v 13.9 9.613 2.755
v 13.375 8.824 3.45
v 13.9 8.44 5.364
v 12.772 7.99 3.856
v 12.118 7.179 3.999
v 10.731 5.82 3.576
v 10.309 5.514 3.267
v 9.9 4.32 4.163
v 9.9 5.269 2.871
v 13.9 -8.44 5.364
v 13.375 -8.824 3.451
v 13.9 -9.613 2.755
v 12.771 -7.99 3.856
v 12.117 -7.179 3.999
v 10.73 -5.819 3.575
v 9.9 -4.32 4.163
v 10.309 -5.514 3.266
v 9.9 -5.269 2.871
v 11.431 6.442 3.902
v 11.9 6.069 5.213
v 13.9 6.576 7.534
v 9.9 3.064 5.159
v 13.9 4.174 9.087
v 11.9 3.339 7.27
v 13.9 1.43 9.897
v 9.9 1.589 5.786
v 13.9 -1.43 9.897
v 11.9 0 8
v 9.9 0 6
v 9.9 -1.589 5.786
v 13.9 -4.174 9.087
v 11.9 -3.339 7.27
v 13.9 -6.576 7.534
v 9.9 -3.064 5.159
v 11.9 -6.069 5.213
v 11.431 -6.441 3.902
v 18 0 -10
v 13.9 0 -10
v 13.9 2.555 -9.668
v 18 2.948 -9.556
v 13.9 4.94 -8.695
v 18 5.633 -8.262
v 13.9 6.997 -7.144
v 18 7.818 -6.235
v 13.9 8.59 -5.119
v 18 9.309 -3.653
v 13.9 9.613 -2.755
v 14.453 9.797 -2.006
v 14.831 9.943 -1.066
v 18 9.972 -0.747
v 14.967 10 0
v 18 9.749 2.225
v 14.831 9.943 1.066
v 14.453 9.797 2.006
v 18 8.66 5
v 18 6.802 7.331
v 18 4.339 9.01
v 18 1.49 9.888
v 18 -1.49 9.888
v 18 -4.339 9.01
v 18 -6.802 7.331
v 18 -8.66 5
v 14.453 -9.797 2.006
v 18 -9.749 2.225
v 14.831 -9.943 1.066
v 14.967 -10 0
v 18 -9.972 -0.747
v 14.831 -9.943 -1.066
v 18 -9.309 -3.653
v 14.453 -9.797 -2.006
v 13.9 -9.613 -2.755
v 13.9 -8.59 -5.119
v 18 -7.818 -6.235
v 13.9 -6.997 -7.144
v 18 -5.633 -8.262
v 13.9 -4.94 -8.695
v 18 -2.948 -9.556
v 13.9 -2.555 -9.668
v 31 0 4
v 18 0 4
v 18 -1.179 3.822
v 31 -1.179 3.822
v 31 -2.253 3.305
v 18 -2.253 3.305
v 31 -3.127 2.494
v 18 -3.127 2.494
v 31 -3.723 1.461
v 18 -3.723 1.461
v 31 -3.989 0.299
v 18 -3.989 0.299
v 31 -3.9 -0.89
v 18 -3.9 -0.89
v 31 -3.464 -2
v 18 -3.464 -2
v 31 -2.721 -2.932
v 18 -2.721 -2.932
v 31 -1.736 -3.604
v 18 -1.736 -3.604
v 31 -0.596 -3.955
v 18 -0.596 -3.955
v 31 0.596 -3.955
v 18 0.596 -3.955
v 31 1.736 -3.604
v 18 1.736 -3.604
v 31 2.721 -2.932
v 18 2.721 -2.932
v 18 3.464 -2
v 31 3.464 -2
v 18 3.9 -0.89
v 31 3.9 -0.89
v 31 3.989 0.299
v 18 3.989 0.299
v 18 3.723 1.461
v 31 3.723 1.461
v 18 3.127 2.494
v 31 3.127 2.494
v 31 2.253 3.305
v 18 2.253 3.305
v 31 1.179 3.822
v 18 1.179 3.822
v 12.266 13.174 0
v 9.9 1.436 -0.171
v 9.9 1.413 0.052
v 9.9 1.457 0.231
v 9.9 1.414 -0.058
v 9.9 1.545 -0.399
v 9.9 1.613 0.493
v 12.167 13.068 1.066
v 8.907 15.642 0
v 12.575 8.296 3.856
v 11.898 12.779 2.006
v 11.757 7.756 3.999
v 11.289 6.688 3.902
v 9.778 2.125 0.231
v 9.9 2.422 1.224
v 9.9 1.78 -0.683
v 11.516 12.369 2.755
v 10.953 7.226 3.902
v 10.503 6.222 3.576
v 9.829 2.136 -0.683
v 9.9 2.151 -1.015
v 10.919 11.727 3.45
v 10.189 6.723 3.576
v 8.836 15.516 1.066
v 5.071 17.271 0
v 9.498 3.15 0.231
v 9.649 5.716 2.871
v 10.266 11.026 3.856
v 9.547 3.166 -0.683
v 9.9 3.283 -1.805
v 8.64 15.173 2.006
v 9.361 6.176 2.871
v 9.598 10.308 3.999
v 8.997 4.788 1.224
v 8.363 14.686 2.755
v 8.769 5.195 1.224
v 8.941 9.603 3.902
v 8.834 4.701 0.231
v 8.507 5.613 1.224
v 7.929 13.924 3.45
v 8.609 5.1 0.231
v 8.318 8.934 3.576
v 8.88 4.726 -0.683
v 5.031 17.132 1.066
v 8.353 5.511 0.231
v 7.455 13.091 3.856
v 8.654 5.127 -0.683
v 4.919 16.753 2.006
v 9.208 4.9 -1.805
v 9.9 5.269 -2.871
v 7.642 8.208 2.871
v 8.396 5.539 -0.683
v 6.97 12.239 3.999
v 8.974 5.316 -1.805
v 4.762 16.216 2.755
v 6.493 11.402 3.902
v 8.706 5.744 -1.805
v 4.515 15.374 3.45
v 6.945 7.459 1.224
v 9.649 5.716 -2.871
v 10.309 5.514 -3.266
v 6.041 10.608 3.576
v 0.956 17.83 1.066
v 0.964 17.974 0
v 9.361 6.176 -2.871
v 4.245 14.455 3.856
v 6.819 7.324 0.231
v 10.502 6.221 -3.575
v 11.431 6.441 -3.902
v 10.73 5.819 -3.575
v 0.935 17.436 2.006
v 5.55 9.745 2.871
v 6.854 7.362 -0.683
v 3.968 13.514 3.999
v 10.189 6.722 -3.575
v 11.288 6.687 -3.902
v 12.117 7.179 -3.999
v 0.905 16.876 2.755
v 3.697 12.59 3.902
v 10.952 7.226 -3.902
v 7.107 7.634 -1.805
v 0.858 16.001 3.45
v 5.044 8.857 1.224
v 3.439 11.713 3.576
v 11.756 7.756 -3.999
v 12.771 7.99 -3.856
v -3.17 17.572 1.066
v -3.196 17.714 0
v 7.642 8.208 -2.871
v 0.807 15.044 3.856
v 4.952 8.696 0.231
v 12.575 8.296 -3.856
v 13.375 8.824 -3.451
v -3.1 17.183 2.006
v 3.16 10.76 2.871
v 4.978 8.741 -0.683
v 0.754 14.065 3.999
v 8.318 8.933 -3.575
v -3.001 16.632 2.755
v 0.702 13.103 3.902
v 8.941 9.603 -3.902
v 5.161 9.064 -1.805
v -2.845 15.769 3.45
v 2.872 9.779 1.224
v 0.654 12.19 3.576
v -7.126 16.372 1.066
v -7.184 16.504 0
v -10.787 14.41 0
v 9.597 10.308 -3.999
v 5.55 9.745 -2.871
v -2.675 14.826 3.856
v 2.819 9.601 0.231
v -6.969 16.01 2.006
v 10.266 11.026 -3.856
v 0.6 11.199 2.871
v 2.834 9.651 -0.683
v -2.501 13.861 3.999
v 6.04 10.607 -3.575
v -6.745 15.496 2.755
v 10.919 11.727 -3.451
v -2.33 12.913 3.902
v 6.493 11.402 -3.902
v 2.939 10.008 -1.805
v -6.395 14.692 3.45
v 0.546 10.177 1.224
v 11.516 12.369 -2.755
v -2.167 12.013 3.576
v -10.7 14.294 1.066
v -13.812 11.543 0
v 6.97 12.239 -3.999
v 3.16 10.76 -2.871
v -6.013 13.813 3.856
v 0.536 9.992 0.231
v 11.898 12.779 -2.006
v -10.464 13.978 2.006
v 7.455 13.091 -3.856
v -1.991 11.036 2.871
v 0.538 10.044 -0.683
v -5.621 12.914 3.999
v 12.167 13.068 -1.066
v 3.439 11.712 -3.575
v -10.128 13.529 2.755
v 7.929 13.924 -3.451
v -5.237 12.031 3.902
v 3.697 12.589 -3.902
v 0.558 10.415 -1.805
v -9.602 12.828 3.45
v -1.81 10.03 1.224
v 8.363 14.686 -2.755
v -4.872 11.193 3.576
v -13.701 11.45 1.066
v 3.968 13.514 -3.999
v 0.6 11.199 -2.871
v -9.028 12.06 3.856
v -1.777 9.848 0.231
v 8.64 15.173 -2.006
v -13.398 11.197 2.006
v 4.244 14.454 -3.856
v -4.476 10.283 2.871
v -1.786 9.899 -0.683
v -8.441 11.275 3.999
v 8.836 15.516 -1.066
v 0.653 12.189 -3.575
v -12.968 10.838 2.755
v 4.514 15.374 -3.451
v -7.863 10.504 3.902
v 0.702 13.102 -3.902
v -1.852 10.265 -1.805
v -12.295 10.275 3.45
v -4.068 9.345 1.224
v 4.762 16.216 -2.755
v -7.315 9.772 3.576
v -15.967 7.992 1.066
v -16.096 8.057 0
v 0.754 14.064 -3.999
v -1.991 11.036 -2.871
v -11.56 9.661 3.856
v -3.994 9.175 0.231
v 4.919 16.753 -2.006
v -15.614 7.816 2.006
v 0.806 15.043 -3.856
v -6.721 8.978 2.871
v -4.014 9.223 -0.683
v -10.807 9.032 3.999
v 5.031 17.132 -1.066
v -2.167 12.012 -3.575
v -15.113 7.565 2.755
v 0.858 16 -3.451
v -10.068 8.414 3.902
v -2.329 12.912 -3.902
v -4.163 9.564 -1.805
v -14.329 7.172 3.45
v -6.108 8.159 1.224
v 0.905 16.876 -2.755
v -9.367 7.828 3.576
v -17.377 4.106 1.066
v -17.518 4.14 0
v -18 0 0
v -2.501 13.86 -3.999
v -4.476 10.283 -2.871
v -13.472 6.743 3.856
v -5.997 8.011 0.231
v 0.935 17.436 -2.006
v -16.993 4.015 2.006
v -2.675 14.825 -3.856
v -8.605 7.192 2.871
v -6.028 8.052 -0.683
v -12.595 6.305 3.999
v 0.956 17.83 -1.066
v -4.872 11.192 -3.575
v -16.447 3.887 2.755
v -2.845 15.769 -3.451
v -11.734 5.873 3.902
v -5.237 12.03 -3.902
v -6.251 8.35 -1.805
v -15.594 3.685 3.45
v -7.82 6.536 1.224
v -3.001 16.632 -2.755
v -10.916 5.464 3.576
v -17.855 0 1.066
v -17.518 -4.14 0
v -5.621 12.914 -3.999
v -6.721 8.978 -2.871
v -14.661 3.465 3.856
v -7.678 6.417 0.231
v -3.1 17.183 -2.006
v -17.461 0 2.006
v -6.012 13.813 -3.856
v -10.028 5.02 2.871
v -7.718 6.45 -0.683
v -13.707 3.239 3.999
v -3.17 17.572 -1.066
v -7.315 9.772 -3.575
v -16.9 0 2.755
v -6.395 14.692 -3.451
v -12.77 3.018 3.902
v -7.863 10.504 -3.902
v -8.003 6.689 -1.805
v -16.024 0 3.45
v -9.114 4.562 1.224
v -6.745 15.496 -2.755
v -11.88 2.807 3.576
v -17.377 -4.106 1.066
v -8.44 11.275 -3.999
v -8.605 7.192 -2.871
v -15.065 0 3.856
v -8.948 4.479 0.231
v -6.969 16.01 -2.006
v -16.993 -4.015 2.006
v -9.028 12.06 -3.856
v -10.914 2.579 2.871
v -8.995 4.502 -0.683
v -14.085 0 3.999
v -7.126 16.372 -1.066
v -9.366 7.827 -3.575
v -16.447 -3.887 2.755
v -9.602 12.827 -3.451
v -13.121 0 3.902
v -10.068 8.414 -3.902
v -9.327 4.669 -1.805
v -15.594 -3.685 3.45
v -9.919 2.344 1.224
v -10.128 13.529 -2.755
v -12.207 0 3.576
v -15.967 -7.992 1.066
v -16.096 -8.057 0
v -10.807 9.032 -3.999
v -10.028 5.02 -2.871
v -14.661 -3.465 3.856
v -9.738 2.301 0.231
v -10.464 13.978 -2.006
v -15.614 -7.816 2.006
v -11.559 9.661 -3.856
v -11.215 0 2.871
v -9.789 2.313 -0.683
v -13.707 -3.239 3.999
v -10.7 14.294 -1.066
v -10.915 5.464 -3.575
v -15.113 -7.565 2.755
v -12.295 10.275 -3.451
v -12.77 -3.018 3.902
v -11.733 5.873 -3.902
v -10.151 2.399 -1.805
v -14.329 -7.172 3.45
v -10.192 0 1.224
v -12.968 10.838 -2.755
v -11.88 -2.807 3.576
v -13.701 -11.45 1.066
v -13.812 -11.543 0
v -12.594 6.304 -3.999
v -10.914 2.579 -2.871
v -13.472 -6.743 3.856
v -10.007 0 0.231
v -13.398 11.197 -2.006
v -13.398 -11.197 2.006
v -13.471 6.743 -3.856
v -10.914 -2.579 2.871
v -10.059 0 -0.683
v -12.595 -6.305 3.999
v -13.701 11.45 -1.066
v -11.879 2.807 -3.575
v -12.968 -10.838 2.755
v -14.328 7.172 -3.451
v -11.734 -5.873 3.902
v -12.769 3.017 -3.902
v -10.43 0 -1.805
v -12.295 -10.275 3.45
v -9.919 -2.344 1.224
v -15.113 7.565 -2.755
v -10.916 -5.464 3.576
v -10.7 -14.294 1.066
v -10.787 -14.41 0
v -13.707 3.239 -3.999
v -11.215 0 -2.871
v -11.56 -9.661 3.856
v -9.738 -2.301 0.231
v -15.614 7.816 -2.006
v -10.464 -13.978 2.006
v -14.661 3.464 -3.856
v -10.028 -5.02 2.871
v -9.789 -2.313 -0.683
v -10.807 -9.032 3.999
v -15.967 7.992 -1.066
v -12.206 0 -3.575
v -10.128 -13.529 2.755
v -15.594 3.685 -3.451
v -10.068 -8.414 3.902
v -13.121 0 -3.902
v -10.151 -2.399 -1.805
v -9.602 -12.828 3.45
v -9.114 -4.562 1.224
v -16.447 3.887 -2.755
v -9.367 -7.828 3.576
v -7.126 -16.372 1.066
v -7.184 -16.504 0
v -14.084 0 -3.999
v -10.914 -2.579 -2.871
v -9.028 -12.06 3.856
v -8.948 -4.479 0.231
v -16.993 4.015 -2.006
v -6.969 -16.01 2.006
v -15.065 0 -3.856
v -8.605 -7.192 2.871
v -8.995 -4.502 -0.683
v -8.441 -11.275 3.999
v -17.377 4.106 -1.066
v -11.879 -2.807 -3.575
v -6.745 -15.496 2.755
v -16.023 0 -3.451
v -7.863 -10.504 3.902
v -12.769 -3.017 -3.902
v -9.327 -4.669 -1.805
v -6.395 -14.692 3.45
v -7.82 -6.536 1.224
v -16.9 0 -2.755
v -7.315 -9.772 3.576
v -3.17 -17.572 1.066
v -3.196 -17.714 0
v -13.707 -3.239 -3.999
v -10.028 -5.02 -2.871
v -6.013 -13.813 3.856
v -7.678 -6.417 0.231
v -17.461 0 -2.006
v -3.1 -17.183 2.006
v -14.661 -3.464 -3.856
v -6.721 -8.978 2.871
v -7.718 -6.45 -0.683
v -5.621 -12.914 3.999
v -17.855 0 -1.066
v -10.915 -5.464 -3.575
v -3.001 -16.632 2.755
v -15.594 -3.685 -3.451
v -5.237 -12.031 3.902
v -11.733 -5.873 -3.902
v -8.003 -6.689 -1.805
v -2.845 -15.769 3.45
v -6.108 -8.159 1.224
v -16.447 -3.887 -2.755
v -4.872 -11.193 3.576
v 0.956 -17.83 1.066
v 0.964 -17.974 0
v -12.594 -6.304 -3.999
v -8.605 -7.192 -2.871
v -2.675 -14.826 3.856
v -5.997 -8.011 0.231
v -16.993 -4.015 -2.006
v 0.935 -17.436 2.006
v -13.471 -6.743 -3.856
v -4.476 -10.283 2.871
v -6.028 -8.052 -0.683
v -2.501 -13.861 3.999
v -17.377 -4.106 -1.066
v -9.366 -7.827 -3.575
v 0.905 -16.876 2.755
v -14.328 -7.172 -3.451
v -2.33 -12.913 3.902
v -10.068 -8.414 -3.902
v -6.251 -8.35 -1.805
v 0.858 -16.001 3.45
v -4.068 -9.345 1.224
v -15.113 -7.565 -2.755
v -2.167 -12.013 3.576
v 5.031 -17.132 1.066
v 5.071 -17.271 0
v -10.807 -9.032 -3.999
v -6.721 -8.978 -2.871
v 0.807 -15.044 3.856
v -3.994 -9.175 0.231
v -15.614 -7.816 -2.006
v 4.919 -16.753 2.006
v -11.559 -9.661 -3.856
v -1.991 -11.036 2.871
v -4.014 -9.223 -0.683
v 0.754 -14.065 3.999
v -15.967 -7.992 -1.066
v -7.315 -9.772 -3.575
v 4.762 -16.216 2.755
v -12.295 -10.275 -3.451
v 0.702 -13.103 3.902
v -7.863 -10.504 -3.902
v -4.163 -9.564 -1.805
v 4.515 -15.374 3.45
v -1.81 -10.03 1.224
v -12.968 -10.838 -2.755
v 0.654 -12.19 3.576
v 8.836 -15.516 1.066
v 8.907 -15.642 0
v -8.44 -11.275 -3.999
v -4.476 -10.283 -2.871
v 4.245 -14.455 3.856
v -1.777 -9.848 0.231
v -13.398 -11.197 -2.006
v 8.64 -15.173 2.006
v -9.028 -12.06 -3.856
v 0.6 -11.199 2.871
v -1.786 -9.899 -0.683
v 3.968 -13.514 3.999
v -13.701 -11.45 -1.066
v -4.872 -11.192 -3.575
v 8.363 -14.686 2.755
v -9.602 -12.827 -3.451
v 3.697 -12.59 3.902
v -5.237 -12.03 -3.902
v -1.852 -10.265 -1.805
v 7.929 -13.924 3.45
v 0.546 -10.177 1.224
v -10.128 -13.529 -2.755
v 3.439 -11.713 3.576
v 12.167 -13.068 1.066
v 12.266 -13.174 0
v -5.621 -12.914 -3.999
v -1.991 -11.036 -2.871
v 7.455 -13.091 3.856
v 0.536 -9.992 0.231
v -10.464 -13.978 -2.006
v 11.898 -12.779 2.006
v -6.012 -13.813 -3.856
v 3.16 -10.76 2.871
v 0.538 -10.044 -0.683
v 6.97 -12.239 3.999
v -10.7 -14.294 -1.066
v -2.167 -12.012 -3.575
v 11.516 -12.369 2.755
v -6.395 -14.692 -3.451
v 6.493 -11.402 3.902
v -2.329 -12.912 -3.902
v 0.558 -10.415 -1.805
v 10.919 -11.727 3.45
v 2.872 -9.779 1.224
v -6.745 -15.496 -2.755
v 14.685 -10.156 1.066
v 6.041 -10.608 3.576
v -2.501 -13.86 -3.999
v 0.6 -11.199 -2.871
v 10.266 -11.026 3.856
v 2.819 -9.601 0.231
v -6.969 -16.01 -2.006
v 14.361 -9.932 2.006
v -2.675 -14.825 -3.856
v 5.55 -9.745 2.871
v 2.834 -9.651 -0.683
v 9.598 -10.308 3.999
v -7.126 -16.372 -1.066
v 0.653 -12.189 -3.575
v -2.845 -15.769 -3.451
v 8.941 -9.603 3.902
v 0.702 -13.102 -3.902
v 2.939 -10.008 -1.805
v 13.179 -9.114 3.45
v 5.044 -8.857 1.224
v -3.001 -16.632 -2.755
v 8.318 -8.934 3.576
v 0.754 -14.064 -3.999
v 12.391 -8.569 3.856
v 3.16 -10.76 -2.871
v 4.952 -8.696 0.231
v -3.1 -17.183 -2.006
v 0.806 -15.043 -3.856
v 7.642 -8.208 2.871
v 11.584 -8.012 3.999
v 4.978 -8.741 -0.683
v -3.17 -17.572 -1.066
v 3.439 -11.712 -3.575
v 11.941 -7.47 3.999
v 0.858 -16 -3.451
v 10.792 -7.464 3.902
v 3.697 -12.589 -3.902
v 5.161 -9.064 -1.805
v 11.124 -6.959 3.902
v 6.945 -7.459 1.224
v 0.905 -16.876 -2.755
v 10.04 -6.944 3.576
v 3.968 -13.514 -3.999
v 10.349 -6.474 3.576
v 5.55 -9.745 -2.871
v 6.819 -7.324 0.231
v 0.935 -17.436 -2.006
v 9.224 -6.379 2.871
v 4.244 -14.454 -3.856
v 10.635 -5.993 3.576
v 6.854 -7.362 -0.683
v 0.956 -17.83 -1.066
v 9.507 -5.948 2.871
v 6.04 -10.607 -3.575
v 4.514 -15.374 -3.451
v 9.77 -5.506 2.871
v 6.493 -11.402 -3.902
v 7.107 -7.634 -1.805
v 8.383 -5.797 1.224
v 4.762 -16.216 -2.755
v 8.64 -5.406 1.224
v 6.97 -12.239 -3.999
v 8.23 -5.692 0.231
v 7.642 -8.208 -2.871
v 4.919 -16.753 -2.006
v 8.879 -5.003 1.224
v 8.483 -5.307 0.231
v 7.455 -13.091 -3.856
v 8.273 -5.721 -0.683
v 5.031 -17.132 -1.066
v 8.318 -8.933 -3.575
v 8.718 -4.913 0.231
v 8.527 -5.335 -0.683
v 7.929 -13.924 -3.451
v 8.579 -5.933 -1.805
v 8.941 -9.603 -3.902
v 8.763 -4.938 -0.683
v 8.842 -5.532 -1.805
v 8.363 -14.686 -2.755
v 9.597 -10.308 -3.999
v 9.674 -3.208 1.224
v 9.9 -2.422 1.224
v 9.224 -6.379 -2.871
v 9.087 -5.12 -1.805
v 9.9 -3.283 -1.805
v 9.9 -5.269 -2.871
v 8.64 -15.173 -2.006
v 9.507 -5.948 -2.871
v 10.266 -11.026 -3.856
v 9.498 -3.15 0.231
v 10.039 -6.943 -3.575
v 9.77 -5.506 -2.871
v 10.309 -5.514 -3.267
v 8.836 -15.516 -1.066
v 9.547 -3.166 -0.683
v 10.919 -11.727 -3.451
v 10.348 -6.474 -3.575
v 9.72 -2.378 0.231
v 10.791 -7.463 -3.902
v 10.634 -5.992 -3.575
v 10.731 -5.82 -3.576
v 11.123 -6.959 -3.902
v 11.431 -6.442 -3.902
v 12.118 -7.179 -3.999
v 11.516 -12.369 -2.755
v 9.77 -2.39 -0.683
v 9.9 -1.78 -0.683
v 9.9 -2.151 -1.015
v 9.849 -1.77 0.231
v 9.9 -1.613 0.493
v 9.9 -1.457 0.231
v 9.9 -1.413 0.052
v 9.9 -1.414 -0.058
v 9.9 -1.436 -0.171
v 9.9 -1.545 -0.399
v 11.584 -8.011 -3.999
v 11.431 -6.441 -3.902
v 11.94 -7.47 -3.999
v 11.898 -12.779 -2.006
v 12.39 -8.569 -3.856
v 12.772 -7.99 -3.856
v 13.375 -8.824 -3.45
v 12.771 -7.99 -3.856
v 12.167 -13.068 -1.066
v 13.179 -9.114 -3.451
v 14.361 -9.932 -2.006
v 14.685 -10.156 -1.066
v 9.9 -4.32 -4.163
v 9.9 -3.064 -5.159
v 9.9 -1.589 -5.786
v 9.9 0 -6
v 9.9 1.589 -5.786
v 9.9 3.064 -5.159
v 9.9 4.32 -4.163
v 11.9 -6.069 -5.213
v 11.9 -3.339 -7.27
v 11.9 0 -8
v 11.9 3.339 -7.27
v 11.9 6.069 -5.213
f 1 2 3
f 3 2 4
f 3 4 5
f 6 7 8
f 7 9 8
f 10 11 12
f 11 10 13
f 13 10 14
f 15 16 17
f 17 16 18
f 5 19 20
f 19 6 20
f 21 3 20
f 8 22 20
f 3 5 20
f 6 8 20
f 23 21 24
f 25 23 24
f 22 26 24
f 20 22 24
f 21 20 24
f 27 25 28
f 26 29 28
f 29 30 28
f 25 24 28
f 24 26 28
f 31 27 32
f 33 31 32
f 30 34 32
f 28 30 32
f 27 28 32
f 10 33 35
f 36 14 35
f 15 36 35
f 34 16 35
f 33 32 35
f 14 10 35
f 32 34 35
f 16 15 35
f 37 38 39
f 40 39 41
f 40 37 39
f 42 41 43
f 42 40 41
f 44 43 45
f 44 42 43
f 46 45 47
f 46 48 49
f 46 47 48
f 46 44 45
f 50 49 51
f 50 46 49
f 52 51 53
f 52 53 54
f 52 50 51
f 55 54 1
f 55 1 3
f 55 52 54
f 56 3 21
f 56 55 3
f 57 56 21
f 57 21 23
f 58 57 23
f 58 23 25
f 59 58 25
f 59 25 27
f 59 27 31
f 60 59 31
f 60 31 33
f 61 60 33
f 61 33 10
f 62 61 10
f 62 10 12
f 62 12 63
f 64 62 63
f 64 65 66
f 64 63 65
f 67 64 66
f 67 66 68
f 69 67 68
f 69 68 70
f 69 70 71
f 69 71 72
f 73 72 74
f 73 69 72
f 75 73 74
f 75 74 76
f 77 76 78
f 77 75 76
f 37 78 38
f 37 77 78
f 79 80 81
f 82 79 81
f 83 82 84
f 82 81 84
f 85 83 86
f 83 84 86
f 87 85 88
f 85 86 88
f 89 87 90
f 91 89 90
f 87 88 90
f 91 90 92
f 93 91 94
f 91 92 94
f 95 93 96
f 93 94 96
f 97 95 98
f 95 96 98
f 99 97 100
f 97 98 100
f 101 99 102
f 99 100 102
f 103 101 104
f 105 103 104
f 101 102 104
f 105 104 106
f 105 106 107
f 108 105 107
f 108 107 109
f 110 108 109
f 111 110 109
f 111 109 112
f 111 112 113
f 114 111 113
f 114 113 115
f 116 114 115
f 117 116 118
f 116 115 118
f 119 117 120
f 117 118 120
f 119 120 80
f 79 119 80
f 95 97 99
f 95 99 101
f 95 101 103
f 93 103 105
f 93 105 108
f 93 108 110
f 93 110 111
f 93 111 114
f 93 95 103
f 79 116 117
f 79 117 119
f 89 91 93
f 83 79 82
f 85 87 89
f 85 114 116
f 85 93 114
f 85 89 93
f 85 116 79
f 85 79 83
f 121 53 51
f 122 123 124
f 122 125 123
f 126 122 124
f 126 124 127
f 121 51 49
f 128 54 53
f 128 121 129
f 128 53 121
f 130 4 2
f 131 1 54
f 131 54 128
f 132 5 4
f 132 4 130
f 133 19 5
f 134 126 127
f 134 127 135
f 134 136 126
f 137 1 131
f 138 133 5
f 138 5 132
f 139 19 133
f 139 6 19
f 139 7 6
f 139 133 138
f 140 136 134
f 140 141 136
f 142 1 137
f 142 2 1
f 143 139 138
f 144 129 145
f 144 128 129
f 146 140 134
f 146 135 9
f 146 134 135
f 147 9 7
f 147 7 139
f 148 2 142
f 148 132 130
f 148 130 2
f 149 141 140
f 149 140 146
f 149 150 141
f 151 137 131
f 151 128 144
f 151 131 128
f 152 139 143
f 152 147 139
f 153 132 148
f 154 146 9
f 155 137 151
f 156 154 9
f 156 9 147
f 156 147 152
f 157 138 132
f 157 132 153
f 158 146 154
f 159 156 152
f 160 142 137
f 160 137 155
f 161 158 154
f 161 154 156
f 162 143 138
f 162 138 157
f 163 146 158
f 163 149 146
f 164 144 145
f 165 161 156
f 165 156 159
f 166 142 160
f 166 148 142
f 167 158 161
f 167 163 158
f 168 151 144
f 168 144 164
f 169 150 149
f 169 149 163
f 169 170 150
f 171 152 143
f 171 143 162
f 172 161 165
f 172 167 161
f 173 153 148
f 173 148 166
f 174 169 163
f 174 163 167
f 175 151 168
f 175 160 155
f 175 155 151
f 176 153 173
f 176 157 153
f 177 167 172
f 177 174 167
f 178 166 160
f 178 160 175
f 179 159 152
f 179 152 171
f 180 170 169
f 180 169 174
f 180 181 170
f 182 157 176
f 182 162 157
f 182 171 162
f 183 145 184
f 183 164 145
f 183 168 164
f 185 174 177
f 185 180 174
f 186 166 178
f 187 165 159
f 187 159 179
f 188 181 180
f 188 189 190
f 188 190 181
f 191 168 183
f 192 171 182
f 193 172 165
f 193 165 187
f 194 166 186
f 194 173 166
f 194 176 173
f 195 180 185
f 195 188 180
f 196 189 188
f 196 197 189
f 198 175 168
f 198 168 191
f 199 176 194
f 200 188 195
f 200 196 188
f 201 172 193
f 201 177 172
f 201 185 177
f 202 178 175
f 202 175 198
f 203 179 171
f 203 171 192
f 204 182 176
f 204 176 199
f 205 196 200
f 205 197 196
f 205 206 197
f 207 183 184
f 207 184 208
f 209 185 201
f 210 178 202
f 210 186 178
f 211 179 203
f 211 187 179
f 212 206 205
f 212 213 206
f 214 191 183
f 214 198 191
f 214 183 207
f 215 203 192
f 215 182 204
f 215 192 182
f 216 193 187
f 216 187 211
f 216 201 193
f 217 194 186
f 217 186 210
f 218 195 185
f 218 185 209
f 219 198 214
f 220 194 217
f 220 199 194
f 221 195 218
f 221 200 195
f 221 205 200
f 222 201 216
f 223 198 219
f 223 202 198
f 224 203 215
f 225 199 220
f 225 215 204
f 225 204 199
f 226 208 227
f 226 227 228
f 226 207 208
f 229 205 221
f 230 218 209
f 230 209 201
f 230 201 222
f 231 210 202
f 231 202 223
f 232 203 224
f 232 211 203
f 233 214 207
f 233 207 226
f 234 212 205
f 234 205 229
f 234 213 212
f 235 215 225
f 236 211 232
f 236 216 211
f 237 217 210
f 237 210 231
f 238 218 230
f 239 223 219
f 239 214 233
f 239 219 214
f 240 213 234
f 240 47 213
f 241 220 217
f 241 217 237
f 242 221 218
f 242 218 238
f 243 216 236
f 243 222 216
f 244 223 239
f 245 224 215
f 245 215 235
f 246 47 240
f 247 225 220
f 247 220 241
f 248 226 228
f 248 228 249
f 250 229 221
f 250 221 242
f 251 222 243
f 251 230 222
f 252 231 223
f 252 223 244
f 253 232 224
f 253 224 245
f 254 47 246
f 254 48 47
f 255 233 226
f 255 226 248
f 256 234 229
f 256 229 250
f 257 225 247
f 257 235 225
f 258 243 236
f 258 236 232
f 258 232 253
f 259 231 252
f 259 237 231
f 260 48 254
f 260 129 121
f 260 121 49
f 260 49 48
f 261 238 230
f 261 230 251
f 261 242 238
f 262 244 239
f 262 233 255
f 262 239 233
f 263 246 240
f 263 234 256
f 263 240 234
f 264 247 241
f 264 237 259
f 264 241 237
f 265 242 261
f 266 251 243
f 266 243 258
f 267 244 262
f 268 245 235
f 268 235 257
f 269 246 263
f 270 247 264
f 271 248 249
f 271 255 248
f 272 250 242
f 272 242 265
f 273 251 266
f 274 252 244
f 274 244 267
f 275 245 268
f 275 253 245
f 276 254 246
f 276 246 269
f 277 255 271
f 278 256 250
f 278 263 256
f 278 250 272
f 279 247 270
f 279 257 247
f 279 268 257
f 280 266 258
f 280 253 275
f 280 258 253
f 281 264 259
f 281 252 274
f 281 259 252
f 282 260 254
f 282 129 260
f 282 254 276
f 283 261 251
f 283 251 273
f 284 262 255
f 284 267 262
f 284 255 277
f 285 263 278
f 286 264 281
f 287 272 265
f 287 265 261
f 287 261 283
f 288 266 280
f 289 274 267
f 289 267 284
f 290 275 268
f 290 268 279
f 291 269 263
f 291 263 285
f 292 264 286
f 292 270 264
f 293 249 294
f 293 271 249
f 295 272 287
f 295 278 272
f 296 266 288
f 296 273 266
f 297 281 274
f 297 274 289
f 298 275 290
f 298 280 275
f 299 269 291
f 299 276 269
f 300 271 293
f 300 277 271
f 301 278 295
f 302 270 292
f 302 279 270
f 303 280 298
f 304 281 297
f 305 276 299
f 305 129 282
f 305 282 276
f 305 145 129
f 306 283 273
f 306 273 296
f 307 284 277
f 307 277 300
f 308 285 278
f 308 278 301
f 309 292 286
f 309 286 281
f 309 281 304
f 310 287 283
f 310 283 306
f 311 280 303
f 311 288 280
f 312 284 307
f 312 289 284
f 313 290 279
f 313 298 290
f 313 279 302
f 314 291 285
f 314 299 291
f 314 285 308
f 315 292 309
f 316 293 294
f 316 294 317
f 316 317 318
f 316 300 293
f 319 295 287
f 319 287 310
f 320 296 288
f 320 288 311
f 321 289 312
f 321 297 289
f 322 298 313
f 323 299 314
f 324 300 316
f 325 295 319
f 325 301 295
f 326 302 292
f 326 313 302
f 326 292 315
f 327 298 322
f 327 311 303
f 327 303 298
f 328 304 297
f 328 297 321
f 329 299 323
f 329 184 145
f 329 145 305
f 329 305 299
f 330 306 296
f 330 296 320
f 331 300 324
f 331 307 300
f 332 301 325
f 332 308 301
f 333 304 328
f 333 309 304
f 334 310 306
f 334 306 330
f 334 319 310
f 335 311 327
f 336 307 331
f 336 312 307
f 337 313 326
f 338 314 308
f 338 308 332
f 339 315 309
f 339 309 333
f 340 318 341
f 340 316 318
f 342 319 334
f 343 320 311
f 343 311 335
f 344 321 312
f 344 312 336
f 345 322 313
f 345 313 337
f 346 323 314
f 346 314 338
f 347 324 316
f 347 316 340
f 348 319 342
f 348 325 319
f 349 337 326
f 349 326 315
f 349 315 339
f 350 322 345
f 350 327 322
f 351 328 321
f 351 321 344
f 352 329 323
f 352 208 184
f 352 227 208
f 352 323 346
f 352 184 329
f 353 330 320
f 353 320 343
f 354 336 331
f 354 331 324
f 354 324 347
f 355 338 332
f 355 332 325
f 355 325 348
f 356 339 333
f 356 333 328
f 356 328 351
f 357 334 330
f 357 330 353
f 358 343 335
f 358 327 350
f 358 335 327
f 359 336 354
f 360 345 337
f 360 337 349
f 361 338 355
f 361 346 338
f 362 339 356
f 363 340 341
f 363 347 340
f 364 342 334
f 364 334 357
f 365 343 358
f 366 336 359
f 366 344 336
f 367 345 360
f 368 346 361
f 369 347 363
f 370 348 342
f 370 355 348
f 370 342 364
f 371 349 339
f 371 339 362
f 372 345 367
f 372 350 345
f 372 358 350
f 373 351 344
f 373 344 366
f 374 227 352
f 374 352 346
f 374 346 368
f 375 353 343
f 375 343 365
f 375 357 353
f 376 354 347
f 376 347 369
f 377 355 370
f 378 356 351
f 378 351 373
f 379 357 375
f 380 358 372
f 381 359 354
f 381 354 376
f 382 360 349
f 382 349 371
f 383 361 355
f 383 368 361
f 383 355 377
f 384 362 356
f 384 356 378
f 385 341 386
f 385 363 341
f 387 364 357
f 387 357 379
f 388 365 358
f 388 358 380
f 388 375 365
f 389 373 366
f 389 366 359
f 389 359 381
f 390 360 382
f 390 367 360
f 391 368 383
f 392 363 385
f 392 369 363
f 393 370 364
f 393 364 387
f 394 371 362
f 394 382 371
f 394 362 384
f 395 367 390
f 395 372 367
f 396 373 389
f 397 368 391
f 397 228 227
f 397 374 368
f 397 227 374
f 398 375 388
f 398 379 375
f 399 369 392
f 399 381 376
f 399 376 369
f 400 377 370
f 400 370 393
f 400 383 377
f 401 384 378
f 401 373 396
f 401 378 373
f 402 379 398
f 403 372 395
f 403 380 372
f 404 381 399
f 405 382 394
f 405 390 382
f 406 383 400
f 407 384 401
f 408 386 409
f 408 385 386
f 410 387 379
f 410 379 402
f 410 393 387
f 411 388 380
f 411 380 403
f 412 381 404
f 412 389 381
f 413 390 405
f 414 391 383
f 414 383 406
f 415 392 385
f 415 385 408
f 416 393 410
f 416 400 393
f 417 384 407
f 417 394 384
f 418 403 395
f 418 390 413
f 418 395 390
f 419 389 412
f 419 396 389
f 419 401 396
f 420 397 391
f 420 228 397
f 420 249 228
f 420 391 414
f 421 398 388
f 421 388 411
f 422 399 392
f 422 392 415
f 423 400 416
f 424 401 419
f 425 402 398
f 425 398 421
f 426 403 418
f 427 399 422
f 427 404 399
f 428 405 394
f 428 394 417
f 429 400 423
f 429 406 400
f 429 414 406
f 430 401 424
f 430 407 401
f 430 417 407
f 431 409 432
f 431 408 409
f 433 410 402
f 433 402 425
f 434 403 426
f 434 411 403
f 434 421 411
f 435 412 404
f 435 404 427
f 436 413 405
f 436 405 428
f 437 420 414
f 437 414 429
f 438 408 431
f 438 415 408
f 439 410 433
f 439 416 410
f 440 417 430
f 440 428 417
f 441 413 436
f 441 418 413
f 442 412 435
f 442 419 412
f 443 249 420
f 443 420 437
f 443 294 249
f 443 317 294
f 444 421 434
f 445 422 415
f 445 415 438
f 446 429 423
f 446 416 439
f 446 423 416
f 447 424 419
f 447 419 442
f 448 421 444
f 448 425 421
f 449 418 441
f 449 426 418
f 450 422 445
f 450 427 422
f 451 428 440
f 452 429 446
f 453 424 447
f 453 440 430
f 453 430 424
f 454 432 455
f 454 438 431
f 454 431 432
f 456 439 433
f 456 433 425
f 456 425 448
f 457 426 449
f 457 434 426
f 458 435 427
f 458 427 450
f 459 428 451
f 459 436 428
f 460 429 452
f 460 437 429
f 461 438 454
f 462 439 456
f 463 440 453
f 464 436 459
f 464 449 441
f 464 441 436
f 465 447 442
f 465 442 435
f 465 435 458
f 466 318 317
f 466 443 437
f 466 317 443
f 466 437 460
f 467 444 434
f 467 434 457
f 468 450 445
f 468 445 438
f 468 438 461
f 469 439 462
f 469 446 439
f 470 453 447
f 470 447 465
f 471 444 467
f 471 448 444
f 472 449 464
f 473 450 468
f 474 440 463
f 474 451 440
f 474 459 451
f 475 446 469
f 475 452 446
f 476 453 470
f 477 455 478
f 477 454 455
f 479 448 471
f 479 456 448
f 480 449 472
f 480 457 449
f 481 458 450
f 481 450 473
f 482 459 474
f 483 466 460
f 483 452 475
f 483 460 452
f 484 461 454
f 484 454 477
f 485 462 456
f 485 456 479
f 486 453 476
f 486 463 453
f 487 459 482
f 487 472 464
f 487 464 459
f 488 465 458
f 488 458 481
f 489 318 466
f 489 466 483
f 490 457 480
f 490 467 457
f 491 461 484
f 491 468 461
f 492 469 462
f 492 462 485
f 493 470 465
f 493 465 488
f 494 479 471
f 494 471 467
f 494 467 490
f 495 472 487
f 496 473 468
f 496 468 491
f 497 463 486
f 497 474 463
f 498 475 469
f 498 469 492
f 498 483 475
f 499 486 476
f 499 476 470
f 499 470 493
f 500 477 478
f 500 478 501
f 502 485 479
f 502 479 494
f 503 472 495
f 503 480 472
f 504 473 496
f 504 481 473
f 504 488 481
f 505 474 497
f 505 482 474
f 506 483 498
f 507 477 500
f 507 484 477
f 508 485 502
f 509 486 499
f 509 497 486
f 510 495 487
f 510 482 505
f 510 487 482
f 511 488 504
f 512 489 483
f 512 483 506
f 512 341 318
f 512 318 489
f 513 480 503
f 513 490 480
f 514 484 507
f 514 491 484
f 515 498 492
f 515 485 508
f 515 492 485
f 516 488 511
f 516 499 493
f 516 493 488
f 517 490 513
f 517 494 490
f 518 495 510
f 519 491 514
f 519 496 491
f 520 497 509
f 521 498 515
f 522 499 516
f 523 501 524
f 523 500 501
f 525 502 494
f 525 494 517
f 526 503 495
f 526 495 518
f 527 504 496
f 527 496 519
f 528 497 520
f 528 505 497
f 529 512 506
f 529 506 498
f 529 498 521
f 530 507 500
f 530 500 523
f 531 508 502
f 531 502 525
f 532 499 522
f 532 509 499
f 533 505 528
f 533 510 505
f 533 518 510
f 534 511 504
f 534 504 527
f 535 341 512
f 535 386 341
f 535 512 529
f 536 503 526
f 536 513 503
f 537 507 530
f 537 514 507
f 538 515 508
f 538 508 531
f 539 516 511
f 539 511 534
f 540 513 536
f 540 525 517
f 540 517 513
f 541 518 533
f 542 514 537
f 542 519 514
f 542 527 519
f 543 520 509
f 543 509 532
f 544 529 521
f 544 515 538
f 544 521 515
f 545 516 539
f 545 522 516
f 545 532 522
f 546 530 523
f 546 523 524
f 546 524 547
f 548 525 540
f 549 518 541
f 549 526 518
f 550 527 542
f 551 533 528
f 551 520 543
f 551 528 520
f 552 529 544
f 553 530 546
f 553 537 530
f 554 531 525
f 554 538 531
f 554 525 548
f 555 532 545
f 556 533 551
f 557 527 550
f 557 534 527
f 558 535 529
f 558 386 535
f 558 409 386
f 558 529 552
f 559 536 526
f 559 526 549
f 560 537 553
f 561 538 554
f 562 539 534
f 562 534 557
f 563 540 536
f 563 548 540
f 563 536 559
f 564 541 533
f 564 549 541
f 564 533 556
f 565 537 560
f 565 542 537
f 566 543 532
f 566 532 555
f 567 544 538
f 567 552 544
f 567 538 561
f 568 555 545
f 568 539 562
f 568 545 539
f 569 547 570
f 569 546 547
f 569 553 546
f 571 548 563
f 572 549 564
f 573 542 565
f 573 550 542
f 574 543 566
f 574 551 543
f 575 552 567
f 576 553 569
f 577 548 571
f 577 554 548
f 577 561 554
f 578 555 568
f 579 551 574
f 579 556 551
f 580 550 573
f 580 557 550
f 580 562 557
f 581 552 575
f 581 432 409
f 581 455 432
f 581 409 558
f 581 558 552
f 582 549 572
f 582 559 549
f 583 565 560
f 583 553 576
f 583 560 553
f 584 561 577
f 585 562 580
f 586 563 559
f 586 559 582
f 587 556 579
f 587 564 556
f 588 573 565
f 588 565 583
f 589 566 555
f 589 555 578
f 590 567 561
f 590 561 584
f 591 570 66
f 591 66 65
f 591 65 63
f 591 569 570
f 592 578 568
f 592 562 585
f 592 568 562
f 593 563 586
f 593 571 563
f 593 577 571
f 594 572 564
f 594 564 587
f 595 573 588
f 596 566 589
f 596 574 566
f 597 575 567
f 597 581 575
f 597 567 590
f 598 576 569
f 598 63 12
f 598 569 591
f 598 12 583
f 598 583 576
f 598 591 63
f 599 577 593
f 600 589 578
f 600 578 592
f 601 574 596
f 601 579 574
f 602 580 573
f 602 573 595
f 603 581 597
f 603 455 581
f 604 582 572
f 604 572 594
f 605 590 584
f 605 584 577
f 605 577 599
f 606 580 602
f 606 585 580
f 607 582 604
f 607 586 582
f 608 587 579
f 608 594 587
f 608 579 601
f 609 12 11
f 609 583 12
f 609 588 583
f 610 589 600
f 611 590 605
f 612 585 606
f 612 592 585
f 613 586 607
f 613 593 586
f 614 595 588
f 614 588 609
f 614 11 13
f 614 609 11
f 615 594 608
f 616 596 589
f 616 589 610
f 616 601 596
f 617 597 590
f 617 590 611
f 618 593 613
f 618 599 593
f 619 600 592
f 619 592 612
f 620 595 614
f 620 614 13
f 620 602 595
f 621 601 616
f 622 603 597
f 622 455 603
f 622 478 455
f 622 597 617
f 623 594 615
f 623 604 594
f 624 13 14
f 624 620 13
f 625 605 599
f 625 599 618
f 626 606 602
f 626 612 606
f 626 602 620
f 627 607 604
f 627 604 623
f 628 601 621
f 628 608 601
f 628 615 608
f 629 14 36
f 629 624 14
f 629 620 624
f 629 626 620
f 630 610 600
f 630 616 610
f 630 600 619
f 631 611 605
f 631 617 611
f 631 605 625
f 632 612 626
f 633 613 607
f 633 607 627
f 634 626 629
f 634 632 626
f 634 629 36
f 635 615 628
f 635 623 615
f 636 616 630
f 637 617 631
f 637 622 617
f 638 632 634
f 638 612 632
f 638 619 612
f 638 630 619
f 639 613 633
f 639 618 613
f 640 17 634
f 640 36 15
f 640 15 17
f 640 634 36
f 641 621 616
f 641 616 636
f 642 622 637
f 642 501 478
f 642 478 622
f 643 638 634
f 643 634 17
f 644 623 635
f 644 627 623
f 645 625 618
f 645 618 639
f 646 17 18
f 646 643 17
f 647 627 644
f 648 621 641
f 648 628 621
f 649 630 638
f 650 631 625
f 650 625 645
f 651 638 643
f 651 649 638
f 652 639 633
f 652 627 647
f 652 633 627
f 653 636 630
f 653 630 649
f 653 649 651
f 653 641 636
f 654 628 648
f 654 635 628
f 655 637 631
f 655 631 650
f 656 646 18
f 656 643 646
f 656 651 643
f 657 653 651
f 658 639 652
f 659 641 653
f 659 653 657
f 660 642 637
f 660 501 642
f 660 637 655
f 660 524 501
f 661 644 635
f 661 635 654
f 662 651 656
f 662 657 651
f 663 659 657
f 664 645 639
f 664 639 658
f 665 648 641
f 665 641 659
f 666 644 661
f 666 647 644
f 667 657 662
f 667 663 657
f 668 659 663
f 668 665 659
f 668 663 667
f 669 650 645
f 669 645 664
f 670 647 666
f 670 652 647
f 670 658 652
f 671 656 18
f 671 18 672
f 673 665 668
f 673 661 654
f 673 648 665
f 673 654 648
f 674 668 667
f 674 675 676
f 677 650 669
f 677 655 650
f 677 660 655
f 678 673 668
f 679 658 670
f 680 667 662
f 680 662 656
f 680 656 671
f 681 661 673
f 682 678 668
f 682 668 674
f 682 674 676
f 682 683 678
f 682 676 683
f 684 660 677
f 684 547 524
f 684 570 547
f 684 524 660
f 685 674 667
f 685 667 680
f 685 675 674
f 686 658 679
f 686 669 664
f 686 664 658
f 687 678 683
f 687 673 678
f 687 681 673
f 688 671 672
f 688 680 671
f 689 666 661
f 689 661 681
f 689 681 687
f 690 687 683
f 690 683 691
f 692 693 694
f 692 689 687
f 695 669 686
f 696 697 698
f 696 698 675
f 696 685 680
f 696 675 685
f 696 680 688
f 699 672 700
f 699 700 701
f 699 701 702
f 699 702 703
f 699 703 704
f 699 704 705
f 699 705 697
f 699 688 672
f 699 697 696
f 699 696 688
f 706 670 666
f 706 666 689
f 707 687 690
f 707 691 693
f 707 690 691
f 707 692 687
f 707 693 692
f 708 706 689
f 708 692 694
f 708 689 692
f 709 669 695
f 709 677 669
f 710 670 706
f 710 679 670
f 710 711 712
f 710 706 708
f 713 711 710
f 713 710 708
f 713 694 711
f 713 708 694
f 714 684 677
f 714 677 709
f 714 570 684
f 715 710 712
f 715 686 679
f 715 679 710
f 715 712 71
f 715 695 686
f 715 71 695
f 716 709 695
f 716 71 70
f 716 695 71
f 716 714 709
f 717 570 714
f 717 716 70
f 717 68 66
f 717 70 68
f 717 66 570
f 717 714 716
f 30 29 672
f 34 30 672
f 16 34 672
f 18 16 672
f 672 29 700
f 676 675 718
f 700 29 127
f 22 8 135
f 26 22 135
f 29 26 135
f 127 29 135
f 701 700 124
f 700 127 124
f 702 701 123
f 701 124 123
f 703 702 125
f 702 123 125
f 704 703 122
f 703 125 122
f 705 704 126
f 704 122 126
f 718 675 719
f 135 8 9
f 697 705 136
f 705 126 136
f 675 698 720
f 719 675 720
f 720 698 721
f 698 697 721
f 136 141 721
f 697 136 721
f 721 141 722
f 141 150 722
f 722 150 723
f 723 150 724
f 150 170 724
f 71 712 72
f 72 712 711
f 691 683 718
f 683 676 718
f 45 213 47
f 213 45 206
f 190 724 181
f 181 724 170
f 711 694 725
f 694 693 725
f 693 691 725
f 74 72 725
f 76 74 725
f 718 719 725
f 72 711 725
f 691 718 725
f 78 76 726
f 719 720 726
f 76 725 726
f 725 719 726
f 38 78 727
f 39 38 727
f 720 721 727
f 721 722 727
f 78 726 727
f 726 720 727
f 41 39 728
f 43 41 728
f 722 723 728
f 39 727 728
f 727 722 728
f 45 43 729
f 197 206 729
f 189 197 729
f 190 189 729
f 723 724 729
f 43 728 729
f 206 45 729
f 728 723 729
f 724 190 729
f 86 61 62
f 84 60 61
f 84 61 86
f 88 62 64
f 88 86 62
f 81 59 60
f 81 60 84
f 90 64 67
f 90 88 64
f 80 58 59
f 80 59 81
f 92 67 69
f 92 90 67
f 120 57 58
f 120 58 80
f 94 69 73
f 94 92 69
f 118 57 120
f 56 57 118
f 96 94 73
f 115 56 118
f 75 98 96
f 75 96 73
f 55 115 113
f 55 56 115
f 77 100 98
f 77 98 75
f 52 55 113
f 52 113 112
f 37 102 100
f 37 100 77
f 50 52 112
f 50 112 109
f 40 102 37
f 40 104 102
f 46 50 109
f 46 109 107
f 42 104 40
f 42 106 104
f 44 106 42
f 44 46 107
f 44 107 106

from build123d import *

# Parameters (mm, degrees)
IZIM2_R                     = 4
Y_KSEKLIK_EKSTR_ZYON1_START = 18
IZIM4_R                     = 10
Y_KSEKLIK_EKSTR_ZYON1_DEPTH = 8.1
PAH1_SIZE                   = 4
IZIM6_R                     = 4
Y_KSEKLIK_EKSTR_ZYON2_DEPTH = 13


with BuildPart() as part:
    # Süpür1: sweep along a path in Çizim1
    with BuildLine(Plane.XY) as s_p_r1_path:
        CenterArc((0, 0), 14, 0, 360)
    # Çizim2 → Süpür1 (sweep)
    with BuildSketch(Plane(origin=(0, 0, 0), x_dir=(1, 0, 0), z_dir=(0, 1, 0))):
        with Locations((14, 0)):
            Circle(IZIM2_R)
    sweep(path=s_p_r1_path.line)

    # Çizim4 → Yükseklik-Ekstrüzyon1 (add)
    with BuildSketch(Plane(origin=(0, 0, 0), x_dir=(0, 0, -1), z_dir=(1, 0, 0)).offset(Y_KSEKLIK_EKSTR_ZYON1_START)):
        Circle(IZIM4_R)
    extrude(amount=-Y_KSEKLIK_EKSTR_ZYON1_DEPTH)

    # Pah1
    pah1_edges = [part.edges().sort_by_distance(p)[0] for p in [
        (9.9, 0, 10),
        (9.9, 5.491506193, -8.357233976),
    ]]
    chamfer(pah1_edges, length=PAH1_SIZE)

    # Çizim6 → Yükseklik-Ekstrüzyon2 (add)
    with BuildSketch(Plane(origin=(18, 0, 0), x_dir=(0, 0, -1), z_dir=(1, 0, 0))):
        with Locations(Location((0, 0, 0), (0, 0, 180))):
            Circle(IZIM6_R)
    extrude(amount=Y_KSEKLIK_EKSTR_ZYON2_DEPTH)


solid = part.part
